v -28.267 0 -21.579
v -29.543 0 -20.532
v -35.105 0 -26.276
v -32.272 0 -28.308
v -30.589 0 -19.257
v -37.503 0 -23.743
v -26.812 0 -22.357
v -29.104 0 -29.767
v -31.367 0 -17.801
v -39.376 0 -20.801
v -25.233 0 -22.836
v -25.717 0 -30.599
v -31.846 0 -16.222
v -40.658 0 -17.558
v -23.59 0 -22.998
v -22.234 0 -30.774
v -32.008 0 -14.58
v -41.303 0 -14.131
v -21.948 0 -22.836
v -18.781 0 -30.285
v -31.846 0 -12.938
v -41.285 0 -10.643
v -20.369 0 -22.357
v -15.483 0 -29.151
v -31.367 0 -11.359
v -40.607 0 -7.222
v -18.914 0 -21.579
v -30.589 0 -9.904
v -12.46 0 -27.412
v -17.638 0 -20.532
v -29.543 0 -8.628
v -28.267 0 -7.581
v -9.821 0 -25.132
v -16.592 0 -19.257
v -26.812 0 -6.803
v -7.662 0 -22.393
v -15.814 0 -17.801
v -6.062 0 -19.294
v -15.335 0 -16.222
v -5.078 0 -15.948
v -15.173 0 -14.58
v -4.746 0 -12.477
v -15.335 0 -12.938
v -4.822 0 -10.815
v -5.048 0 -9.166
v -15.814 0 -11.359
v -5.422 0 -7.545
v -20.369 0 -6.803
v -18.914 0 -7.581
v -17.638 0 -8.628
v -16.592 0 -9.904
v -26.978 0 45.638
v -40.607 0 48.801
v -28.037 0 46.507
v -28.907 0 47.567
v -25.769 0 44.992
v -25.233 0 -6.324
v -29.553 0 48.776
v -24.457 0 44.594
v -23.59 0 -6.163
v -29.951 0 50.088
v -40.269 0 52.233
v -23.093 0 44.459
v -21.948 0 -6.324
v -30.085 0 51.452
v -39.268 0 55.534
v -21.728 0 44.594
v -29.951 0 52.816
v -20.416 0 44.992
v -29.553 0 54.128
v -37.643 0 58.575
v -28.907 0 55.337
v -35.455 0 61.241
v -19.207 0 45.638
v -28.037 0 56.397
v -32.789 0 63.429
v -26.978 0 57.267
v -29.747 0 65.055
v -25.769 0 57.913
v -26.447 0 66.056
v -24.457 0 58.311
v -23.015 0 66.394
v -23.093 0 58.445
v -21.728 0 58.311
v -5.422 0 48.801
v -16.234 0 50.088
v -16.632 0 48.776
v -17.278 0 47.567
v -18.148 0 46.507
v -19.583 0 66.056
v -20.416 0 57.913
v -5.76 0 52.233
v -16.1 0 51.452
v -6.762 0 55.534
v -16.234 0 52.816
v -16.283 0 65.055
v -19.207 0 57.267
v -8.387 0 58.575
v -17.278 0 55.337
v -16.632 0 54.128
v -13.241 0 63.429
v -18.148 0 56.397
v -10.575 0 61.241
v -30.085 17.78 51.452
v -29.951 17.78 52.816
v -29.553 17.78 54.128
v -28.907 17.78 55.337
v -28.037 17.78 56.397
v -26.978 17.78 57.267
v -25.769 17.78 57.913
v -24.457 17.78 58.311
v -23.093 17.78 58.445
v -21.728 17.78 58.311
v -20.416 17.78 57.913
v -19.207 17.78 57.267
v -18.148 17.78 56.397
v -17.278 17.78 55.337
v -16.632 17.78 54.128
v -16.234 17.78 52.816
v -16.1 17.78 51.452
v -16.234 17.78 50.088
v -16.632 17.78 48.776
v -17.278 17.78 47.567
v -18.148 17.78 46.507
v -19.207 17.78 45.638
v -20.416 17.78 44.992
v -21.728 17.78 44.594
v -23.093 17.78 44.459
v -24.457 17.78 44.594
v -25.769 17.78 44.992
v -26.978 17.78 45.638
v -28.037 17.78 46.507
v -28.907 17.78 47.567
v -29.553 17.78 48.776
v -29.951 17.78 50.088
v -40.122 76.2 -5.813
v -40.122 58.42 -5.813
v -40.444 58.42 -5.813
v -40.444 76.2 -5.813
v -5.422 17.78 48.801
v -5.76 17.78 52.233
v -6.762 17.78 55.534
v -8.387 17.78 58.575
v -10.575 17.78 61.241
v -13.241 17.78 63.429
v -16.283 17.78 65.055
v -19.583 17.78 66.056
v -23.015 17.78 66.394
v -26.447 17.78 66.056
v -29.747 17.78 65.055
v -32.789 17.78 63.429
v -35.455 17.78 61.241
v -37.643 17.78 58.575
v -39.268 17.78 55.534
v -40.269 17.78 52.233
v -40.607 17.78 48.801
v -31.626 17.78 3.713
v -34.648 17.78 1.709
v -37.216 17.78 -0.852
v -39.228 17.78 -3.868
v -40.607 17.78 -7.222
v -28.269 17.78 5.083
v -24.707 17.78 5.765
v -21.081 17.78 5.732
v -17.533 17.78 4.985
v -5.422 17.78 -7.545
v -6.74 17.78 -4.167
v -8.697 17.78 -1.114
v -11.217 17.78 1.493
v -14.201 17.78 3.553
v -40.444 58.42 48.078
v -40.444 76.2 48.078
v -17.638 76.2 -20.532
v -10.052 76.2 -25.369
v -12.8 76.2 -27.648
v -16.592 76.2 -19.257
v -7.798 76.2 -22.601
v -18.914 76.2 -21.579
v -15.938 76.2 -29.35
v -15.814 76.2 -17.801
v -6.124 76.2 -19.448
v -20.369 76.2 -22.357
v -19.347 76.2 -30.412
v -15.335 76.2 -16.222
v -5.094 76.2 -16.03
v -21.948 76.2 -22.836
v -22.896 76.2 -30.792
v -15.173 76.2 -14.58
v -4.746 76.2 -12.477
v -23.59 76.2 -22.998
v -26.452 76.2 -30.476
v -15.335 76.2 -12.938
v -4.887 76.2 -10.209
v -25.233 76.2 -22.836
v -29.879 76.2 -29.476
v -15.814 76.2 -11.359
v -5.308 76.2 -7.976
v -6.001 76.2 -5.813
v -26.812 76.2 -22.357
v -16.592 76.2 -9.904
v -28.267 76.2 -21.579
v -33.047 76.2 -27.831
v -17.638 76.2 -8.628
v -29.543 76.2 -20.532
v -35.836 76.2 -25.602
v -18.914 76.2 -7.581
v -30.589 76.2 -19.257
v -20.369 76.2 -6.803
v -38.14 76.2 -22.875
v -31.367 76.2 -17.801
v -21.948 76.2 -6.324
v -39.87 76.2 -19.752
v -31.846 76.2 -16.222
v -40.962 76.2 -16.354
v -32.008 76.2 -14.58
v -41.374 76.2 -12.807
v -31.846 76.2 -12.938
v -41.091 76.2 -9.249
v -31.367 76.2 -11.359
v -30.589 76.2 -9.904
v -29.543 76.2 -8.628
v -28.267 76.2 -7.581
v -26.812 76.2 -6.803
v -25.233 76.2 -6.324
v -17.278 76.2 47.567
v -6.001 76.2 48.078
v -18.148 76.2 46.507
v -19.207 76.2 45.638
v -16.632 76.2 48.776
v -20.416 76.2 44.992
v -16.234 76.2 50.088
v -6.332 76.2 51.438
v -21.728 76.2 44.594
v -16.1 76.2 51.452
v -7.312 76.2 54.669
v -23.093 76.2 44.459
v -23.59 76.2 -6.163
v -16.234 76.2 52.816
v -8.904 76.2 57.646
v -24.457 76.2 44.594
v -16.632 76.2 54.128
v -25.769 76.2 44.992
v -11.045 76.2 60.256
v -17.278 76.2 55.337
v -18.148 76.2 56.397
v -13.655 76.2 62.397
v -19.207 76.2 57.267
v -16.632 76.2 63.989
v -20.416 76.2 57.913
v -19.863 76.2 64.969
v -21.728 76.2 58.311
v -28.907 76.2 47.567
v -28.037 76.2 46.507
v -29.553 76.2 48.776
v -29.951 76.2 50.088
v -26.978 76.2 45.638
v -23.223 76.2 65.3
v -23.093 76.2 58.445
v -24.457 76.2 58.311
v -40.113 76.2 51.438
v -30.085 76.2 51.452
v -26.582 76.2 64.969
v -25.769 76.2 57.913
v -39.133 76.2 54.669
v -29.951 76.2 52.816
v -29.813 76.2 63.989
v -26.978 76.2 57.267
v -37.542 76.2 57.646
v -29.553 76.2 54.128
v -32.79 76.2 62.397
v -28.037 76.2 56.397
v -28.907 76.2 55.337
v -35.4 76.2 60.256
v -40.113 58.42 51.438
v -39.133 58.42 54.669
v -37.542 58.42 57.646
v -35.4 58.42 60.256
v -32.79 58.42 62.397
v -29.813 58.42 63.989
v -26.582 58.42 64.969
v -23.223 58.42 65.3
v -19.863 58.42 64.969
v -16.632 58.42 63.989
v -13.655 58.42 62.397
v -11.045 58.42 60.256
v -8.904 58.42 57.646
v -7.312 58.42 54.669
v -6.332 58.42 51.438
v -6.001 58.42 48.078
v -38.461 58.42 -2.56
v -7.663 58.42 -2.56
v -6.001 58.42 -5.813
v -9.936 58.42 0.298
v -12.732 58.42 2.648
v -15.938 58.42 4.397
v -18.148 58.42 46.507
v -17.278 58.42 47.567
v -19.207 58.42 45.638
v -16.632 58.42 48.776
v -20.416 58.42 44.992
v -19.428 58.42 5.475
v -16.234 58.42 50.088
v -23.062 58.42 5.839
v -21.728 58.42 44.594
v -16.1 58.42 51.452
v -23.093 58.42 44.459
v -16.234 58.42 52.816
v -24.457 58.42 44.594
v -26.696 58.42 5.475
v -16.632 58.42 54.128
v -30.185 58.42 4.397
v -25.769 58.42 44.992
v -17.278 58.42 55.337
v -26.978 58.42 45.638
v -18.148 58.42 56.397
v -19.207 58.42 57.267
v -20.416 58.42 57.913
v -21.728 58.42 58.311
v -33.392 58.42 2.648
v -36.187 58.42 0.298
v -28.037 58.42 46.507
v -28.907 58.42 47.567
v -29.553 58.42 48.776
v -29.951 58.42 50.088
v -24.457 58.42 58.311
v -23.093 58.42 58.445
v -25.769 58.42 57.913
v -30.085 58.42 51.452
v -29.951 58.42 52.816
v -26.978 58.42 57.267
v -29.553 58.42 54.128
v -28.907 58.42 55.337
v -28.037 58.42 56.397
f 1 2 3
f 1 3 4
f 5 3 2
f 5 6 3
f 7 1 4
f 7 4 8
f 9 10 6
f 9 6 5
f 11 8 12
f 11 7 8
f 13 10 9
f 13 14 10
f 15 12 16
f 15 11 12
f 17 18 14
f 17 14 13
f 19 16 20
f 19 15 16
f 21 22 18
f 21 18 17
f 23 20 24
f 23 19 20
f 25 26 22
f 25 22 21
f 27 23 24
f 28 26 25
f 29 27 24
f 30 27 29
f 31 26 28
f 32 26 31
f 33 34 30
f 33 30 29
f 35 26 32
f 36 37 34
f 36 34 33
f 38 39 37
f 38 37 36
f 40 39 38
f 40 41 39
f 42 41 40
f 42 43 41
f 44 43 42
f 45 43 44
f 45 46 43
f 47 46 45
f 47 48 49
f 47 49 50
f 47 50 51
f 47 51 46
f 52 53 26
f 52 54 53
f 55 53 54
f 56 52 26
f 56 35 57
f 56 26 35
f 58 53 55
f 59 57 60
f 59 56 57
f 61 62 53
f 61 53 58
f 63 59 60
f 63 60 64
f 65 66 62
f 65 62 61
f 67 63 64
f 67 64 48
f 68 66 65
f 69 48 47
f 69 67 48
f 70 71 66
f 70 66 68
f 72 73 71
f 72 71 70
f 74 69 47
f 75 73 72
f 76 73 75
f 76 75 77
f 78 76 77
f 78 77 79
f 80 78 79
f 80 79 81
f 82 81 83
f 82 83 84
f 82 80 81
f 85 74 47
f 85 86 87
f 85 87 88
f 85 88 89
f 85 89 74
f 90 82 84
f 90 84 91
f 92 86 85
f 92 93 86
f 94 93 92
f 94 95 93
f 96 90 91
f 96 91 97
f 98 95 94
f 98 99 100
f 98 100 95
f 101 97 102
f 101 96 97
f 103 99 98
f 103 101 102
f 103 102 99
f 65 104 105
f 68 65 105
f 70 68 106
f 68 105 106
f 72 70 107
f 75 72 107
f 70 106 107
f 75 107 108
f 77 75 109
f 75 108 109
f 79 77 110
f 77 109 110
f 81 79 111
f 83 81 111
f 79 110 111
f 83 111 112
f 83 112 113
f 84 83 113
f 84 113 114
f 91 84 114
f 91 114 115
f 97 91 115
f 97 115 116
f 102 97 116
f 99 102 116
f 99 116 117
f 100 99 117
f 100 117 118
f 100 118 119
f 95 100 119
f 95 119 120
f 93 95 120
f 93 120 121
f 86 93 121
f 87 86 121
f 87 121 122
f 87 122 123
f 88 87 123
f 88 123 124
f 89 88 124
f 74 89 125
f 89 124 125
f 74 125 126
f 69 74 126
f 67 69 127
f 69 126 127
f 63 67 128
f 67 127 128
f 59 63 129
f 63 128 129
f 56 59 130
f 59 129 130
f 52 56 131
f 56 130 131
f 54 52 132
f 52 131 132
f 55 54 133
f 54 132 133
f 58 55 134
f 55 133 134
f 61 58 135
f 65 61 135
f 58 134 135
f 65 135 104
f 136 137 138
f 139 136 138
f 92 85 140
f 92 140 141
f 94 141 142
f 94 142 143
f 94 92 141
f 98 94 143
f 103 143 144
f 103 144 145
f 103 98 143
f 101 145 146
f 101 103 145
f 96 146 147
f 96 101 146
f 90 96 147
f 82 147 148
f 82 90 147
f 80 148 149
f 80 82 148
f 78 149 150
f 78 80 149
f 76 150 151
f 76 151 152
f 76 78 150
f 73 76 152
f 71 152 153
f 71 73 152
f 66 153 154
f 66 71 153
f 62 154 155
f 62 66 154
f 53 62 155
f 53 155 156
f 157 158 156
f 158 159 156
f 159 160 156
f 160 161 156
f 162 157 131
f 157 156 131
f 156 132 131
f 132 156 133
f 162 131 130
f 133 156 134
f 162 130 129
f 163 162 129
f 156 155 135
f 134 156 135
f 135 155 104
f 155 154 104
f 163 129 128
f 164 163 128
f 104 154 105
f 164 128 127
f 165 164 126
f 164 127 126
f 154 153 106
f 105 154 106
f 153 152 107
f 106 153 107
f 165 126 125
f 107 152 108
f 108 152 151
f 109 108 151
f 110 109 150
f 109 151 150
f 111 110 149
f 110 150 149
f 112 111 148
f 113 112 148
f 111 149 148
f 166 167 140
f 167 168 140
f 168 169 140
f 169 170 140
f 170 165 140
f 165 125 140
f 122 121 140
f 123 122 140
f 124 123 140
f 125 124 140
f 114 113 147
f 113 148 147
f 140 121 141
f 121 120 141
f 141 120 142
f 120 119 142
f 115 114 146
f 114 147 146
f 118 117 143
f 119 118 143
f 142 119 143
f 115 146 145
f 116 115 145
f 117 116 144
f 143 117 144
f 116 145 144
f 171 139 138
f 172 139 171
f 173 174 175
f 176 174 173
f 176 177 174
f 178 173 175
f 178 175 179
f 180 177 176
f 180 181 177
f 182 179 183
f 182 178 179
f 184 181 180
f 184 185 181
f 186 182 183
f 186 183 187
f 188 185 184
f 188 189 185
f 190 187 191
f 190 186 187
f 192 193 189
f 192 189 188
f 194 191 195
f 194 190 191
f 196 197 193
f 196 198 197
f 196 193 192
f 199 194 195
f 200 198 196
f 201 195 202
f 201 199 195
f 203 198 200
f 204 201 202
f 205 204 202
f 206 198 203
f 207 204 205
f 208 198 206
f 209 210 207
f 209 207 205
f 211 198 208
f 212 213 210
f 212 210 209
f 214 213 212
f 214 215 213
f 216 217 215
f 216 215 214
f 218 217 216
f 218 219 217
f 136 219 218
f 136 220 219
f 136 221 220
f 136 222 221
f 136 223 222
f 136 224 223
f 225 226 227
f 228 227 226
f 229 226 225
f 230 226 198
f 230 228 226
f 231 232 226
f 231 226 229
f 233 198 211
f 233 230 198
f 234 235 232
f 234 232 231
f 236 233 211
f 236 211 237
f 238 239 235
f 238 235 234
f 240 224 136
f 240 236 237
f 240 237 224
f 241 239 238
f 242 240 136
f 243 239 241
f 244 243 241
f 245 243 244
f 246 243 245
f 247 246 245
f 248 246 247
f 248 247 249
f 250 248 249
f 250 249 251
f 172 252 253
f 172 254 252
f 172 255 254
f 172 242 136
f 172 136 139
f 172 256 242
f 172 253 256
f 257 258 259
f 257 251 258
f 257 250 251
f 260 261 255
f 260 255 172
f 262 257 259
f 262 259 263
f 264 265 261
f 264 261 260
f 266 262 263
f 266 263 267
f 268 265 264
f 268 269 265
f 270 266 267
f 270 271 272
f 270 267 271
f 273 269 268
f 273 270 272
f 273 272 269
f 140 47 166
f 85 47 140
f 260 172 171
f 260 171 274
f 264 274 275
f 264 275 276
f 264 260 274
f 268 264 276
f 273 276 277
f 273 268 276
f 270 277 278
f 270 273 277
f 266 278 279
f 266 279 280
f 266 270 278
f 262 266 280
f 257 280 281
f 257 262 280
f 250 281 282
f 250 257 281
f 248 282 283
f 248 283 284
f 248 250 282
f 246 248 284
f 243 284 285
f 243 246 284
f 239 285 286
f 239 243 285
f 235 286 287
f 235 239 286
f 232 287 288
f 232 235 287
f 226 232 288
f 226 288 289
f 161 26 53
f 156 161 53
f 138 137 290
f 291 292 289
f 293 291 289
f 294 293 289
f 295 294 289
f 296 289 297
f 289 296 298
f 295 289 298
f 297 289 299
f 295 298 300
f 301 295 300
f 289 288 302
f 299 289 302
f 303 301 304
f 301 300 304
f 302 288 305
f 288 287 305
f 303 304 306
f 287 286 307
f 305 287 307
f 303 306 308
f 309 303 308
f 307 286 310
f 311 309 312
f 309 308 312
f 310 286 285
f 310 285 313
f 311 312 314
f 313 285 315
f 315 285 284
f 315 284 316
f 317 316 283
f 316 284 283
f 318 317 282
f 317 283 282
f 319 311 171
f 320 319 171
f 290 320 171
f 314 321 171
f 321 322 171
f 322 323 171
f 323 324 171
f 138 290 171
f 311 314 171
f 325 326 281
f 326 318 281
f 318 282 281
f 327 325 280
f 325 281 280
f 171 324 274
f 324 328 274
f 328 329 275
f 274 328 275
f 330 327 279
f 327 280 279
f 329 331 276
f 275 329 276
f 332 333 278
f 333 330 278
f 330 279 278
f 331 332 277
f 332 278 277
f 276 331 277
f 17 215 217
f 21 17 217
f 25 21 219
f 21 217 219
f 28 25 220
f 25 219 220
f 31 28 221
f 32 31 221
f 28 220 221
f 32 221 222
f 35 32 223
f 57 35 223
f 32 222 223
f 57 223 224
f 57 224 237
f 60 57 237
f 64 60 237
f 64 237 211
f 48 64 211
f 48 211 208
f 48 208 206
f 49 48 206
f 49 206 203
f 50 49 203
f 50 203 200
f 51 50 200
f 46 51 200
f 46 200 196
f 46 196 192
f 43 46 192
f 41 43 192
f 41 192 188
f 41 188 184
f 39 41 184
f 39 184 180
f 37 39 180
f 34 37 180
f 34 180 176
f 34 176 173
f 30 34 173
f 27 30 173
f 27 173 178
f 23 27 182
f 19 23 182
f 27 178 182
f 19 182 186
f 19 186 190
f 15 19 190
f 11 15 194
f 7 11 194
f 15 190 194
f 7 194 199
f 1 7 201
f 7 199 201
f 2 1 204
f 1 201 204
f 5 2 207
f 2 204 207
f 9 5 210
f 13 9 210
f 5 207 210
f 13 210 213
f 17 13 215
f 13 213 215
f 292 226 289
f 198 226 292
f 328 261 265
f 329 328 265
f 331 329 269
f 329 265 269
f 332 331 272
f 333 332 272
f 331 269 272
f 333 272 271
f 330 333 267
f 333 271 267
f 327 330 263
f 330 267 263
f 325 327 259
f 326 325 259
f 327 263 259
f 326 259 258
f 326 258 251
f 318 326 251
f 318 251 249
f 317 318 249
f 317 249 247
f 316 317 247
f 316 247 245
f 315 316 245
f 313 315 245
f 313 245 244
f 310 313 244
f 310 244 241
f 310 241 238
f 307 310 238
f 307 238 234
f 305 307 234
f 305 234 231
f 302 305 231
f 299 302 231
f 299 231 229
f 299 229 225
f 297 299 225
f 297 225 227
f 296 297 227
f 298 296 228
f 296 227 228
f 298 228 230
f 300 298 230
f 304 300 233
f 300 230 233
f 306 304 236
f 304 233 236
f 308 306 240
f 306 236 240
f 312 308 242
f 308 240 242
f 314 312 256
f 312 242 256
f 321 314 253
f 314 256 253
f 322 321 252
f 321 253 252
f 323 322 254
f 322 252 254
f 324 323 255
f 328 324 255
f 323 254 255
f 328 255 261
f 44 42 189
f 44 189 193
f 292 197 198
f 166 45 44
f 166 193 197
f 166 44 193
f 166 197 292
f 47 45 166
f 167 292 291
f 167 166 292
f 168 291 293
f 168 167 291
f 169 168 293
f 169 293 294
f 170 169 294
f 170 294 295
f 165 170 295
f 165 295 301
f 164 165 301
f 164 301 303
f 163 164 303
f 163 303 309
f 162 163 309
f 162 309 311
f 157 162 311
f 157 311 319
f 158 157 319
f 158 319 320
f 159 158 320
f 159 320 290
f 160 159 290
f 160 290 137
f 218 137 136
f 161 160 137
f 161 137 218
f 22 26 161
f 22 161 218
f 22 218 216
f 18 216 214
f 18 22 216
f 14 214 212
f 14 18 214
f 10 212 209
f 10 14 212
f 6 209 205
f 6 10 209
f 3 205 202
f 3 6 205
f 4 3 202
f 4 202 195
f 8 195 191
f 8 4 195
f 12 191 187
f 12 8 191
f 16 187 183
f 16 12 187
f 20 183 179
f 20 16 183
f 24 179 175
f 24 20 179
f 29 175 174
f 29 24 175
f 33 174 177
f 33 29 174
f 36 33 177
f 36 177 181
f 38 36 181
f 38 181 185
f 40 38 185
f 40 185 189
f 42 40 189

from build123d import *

# Parameters (mm, degrees)
F0_R      = 18.3156602834
F1_DEPTH  = 76.2
F2_W      = 35.1851196028
F2_H      = 56.3925905153
F3_DEPTH  = 17.78
F5_DEPTH  = 17.78
F7_DEPTH  = 17.78
F9_DEPTH  = 17.78
F10_R     = 6.9929791969
F11_DEPTH = 127
F12_R     = 8.4175574938
F13_DEPTH = 127


with BuildPart() as f1:
    # F0 (on Front) → F1 (new body)
    with BuildSketch(Plane.XZ):
        with Locations((-23.0617076159, -12.4766519293)):
            Circle(F0_R)
    extrude(amount=-F1_DEPTH)

    # F2 (on Front) → F3 (join)
    with BuildSketch(Plane.XZ):
        with Locations((-23.0149261188, 20.6049853005)):
            Rectangle(F2_W, F2_H)
    extrude(amount=-F3_DEPTH)

    # F4 (on face) → F5 (join)
    with BuildSketch(Plane(origin=(0, 76.2, 0), x_dir=(-1, 0, 0), z_dir=(0, 1, 0))):
        with BuildLine():
            Line((6.0013058485, 48.0782985687), (6.0013058485, -5.8128614799))
            ThreePointArc((6.0013058485, -5.8128614799), (23.0617076159, 5.8390083541), (40.1221093832, -5.8128614799))
            Line((40.1221093832, -5.8128614799), (40.4440611601, -5.8128614799))
            Line((40.4440611601, -5.8128614799), (40.4440611601, 48.0782985687))
            Line((40.4440611601, 48.0782985687), (6.0013058485, 48.0782985687))
        make_face()
    extrude(amount=-F5_DEPTH)

    # F6 (on face) → F7 (join)
    with BuildSketch(Plane.XZ):
        with BuildLine():
            Line((-40.6074859202, 48.8012805581), (-5.4223663174, 48.8012805581))
            ThreePointArc((-5.4223663174, 48.8012805581), (-23.0149261188, 66.3938403595), (-40.6074859202, 48.8012805581))
        make_face()
    extrude(amount=-F7_DEPTH)

    # F8 (on face) → F9 (join)
    with BuildSketch(Plane(origin=(0, 76.2, 0), x_dir=(-1, 0, 0), z_dir=(0, 1, 0))):
        with BuildLine():
            Line((6.0013058485, 48.0782985687), (40.4440611601, 48.0782985687))
            ThreePointArc((40.4440611601, 48.0782985687), (23.2226835043, 65.2996762245), (6.0013058485, 48.0782985687))
        make_face()
    extrude(amount=-F9_DEPTH)

    # F10 (on face) → F11 (cut)
    with BuildSketch(Plane(origin=(0, 76.2, 0), x_dir=(-1, 0, 0), z_dir=(0, 1, 0))):
        with Locations((23.0925008655, 51.4522157609)):
            Circle(F10_R)
    extrude(amount=-F11_DEPTH, mode=Mode.SUBTRACT)

    # F12 (on face) → F13 (cut)
    with BuildSketch(Plane(origin=(0, 76.2, 0), x_dir=(-1, 0, 0), z_dir=(0, 1, 0))):
        with Locations((23.5904790461, -14.580136165)):
            Circle(F12_R)
    extrude(amount=-F13_DEPTH, mode=Mode.SUBTRACT)


solid = f1.part
